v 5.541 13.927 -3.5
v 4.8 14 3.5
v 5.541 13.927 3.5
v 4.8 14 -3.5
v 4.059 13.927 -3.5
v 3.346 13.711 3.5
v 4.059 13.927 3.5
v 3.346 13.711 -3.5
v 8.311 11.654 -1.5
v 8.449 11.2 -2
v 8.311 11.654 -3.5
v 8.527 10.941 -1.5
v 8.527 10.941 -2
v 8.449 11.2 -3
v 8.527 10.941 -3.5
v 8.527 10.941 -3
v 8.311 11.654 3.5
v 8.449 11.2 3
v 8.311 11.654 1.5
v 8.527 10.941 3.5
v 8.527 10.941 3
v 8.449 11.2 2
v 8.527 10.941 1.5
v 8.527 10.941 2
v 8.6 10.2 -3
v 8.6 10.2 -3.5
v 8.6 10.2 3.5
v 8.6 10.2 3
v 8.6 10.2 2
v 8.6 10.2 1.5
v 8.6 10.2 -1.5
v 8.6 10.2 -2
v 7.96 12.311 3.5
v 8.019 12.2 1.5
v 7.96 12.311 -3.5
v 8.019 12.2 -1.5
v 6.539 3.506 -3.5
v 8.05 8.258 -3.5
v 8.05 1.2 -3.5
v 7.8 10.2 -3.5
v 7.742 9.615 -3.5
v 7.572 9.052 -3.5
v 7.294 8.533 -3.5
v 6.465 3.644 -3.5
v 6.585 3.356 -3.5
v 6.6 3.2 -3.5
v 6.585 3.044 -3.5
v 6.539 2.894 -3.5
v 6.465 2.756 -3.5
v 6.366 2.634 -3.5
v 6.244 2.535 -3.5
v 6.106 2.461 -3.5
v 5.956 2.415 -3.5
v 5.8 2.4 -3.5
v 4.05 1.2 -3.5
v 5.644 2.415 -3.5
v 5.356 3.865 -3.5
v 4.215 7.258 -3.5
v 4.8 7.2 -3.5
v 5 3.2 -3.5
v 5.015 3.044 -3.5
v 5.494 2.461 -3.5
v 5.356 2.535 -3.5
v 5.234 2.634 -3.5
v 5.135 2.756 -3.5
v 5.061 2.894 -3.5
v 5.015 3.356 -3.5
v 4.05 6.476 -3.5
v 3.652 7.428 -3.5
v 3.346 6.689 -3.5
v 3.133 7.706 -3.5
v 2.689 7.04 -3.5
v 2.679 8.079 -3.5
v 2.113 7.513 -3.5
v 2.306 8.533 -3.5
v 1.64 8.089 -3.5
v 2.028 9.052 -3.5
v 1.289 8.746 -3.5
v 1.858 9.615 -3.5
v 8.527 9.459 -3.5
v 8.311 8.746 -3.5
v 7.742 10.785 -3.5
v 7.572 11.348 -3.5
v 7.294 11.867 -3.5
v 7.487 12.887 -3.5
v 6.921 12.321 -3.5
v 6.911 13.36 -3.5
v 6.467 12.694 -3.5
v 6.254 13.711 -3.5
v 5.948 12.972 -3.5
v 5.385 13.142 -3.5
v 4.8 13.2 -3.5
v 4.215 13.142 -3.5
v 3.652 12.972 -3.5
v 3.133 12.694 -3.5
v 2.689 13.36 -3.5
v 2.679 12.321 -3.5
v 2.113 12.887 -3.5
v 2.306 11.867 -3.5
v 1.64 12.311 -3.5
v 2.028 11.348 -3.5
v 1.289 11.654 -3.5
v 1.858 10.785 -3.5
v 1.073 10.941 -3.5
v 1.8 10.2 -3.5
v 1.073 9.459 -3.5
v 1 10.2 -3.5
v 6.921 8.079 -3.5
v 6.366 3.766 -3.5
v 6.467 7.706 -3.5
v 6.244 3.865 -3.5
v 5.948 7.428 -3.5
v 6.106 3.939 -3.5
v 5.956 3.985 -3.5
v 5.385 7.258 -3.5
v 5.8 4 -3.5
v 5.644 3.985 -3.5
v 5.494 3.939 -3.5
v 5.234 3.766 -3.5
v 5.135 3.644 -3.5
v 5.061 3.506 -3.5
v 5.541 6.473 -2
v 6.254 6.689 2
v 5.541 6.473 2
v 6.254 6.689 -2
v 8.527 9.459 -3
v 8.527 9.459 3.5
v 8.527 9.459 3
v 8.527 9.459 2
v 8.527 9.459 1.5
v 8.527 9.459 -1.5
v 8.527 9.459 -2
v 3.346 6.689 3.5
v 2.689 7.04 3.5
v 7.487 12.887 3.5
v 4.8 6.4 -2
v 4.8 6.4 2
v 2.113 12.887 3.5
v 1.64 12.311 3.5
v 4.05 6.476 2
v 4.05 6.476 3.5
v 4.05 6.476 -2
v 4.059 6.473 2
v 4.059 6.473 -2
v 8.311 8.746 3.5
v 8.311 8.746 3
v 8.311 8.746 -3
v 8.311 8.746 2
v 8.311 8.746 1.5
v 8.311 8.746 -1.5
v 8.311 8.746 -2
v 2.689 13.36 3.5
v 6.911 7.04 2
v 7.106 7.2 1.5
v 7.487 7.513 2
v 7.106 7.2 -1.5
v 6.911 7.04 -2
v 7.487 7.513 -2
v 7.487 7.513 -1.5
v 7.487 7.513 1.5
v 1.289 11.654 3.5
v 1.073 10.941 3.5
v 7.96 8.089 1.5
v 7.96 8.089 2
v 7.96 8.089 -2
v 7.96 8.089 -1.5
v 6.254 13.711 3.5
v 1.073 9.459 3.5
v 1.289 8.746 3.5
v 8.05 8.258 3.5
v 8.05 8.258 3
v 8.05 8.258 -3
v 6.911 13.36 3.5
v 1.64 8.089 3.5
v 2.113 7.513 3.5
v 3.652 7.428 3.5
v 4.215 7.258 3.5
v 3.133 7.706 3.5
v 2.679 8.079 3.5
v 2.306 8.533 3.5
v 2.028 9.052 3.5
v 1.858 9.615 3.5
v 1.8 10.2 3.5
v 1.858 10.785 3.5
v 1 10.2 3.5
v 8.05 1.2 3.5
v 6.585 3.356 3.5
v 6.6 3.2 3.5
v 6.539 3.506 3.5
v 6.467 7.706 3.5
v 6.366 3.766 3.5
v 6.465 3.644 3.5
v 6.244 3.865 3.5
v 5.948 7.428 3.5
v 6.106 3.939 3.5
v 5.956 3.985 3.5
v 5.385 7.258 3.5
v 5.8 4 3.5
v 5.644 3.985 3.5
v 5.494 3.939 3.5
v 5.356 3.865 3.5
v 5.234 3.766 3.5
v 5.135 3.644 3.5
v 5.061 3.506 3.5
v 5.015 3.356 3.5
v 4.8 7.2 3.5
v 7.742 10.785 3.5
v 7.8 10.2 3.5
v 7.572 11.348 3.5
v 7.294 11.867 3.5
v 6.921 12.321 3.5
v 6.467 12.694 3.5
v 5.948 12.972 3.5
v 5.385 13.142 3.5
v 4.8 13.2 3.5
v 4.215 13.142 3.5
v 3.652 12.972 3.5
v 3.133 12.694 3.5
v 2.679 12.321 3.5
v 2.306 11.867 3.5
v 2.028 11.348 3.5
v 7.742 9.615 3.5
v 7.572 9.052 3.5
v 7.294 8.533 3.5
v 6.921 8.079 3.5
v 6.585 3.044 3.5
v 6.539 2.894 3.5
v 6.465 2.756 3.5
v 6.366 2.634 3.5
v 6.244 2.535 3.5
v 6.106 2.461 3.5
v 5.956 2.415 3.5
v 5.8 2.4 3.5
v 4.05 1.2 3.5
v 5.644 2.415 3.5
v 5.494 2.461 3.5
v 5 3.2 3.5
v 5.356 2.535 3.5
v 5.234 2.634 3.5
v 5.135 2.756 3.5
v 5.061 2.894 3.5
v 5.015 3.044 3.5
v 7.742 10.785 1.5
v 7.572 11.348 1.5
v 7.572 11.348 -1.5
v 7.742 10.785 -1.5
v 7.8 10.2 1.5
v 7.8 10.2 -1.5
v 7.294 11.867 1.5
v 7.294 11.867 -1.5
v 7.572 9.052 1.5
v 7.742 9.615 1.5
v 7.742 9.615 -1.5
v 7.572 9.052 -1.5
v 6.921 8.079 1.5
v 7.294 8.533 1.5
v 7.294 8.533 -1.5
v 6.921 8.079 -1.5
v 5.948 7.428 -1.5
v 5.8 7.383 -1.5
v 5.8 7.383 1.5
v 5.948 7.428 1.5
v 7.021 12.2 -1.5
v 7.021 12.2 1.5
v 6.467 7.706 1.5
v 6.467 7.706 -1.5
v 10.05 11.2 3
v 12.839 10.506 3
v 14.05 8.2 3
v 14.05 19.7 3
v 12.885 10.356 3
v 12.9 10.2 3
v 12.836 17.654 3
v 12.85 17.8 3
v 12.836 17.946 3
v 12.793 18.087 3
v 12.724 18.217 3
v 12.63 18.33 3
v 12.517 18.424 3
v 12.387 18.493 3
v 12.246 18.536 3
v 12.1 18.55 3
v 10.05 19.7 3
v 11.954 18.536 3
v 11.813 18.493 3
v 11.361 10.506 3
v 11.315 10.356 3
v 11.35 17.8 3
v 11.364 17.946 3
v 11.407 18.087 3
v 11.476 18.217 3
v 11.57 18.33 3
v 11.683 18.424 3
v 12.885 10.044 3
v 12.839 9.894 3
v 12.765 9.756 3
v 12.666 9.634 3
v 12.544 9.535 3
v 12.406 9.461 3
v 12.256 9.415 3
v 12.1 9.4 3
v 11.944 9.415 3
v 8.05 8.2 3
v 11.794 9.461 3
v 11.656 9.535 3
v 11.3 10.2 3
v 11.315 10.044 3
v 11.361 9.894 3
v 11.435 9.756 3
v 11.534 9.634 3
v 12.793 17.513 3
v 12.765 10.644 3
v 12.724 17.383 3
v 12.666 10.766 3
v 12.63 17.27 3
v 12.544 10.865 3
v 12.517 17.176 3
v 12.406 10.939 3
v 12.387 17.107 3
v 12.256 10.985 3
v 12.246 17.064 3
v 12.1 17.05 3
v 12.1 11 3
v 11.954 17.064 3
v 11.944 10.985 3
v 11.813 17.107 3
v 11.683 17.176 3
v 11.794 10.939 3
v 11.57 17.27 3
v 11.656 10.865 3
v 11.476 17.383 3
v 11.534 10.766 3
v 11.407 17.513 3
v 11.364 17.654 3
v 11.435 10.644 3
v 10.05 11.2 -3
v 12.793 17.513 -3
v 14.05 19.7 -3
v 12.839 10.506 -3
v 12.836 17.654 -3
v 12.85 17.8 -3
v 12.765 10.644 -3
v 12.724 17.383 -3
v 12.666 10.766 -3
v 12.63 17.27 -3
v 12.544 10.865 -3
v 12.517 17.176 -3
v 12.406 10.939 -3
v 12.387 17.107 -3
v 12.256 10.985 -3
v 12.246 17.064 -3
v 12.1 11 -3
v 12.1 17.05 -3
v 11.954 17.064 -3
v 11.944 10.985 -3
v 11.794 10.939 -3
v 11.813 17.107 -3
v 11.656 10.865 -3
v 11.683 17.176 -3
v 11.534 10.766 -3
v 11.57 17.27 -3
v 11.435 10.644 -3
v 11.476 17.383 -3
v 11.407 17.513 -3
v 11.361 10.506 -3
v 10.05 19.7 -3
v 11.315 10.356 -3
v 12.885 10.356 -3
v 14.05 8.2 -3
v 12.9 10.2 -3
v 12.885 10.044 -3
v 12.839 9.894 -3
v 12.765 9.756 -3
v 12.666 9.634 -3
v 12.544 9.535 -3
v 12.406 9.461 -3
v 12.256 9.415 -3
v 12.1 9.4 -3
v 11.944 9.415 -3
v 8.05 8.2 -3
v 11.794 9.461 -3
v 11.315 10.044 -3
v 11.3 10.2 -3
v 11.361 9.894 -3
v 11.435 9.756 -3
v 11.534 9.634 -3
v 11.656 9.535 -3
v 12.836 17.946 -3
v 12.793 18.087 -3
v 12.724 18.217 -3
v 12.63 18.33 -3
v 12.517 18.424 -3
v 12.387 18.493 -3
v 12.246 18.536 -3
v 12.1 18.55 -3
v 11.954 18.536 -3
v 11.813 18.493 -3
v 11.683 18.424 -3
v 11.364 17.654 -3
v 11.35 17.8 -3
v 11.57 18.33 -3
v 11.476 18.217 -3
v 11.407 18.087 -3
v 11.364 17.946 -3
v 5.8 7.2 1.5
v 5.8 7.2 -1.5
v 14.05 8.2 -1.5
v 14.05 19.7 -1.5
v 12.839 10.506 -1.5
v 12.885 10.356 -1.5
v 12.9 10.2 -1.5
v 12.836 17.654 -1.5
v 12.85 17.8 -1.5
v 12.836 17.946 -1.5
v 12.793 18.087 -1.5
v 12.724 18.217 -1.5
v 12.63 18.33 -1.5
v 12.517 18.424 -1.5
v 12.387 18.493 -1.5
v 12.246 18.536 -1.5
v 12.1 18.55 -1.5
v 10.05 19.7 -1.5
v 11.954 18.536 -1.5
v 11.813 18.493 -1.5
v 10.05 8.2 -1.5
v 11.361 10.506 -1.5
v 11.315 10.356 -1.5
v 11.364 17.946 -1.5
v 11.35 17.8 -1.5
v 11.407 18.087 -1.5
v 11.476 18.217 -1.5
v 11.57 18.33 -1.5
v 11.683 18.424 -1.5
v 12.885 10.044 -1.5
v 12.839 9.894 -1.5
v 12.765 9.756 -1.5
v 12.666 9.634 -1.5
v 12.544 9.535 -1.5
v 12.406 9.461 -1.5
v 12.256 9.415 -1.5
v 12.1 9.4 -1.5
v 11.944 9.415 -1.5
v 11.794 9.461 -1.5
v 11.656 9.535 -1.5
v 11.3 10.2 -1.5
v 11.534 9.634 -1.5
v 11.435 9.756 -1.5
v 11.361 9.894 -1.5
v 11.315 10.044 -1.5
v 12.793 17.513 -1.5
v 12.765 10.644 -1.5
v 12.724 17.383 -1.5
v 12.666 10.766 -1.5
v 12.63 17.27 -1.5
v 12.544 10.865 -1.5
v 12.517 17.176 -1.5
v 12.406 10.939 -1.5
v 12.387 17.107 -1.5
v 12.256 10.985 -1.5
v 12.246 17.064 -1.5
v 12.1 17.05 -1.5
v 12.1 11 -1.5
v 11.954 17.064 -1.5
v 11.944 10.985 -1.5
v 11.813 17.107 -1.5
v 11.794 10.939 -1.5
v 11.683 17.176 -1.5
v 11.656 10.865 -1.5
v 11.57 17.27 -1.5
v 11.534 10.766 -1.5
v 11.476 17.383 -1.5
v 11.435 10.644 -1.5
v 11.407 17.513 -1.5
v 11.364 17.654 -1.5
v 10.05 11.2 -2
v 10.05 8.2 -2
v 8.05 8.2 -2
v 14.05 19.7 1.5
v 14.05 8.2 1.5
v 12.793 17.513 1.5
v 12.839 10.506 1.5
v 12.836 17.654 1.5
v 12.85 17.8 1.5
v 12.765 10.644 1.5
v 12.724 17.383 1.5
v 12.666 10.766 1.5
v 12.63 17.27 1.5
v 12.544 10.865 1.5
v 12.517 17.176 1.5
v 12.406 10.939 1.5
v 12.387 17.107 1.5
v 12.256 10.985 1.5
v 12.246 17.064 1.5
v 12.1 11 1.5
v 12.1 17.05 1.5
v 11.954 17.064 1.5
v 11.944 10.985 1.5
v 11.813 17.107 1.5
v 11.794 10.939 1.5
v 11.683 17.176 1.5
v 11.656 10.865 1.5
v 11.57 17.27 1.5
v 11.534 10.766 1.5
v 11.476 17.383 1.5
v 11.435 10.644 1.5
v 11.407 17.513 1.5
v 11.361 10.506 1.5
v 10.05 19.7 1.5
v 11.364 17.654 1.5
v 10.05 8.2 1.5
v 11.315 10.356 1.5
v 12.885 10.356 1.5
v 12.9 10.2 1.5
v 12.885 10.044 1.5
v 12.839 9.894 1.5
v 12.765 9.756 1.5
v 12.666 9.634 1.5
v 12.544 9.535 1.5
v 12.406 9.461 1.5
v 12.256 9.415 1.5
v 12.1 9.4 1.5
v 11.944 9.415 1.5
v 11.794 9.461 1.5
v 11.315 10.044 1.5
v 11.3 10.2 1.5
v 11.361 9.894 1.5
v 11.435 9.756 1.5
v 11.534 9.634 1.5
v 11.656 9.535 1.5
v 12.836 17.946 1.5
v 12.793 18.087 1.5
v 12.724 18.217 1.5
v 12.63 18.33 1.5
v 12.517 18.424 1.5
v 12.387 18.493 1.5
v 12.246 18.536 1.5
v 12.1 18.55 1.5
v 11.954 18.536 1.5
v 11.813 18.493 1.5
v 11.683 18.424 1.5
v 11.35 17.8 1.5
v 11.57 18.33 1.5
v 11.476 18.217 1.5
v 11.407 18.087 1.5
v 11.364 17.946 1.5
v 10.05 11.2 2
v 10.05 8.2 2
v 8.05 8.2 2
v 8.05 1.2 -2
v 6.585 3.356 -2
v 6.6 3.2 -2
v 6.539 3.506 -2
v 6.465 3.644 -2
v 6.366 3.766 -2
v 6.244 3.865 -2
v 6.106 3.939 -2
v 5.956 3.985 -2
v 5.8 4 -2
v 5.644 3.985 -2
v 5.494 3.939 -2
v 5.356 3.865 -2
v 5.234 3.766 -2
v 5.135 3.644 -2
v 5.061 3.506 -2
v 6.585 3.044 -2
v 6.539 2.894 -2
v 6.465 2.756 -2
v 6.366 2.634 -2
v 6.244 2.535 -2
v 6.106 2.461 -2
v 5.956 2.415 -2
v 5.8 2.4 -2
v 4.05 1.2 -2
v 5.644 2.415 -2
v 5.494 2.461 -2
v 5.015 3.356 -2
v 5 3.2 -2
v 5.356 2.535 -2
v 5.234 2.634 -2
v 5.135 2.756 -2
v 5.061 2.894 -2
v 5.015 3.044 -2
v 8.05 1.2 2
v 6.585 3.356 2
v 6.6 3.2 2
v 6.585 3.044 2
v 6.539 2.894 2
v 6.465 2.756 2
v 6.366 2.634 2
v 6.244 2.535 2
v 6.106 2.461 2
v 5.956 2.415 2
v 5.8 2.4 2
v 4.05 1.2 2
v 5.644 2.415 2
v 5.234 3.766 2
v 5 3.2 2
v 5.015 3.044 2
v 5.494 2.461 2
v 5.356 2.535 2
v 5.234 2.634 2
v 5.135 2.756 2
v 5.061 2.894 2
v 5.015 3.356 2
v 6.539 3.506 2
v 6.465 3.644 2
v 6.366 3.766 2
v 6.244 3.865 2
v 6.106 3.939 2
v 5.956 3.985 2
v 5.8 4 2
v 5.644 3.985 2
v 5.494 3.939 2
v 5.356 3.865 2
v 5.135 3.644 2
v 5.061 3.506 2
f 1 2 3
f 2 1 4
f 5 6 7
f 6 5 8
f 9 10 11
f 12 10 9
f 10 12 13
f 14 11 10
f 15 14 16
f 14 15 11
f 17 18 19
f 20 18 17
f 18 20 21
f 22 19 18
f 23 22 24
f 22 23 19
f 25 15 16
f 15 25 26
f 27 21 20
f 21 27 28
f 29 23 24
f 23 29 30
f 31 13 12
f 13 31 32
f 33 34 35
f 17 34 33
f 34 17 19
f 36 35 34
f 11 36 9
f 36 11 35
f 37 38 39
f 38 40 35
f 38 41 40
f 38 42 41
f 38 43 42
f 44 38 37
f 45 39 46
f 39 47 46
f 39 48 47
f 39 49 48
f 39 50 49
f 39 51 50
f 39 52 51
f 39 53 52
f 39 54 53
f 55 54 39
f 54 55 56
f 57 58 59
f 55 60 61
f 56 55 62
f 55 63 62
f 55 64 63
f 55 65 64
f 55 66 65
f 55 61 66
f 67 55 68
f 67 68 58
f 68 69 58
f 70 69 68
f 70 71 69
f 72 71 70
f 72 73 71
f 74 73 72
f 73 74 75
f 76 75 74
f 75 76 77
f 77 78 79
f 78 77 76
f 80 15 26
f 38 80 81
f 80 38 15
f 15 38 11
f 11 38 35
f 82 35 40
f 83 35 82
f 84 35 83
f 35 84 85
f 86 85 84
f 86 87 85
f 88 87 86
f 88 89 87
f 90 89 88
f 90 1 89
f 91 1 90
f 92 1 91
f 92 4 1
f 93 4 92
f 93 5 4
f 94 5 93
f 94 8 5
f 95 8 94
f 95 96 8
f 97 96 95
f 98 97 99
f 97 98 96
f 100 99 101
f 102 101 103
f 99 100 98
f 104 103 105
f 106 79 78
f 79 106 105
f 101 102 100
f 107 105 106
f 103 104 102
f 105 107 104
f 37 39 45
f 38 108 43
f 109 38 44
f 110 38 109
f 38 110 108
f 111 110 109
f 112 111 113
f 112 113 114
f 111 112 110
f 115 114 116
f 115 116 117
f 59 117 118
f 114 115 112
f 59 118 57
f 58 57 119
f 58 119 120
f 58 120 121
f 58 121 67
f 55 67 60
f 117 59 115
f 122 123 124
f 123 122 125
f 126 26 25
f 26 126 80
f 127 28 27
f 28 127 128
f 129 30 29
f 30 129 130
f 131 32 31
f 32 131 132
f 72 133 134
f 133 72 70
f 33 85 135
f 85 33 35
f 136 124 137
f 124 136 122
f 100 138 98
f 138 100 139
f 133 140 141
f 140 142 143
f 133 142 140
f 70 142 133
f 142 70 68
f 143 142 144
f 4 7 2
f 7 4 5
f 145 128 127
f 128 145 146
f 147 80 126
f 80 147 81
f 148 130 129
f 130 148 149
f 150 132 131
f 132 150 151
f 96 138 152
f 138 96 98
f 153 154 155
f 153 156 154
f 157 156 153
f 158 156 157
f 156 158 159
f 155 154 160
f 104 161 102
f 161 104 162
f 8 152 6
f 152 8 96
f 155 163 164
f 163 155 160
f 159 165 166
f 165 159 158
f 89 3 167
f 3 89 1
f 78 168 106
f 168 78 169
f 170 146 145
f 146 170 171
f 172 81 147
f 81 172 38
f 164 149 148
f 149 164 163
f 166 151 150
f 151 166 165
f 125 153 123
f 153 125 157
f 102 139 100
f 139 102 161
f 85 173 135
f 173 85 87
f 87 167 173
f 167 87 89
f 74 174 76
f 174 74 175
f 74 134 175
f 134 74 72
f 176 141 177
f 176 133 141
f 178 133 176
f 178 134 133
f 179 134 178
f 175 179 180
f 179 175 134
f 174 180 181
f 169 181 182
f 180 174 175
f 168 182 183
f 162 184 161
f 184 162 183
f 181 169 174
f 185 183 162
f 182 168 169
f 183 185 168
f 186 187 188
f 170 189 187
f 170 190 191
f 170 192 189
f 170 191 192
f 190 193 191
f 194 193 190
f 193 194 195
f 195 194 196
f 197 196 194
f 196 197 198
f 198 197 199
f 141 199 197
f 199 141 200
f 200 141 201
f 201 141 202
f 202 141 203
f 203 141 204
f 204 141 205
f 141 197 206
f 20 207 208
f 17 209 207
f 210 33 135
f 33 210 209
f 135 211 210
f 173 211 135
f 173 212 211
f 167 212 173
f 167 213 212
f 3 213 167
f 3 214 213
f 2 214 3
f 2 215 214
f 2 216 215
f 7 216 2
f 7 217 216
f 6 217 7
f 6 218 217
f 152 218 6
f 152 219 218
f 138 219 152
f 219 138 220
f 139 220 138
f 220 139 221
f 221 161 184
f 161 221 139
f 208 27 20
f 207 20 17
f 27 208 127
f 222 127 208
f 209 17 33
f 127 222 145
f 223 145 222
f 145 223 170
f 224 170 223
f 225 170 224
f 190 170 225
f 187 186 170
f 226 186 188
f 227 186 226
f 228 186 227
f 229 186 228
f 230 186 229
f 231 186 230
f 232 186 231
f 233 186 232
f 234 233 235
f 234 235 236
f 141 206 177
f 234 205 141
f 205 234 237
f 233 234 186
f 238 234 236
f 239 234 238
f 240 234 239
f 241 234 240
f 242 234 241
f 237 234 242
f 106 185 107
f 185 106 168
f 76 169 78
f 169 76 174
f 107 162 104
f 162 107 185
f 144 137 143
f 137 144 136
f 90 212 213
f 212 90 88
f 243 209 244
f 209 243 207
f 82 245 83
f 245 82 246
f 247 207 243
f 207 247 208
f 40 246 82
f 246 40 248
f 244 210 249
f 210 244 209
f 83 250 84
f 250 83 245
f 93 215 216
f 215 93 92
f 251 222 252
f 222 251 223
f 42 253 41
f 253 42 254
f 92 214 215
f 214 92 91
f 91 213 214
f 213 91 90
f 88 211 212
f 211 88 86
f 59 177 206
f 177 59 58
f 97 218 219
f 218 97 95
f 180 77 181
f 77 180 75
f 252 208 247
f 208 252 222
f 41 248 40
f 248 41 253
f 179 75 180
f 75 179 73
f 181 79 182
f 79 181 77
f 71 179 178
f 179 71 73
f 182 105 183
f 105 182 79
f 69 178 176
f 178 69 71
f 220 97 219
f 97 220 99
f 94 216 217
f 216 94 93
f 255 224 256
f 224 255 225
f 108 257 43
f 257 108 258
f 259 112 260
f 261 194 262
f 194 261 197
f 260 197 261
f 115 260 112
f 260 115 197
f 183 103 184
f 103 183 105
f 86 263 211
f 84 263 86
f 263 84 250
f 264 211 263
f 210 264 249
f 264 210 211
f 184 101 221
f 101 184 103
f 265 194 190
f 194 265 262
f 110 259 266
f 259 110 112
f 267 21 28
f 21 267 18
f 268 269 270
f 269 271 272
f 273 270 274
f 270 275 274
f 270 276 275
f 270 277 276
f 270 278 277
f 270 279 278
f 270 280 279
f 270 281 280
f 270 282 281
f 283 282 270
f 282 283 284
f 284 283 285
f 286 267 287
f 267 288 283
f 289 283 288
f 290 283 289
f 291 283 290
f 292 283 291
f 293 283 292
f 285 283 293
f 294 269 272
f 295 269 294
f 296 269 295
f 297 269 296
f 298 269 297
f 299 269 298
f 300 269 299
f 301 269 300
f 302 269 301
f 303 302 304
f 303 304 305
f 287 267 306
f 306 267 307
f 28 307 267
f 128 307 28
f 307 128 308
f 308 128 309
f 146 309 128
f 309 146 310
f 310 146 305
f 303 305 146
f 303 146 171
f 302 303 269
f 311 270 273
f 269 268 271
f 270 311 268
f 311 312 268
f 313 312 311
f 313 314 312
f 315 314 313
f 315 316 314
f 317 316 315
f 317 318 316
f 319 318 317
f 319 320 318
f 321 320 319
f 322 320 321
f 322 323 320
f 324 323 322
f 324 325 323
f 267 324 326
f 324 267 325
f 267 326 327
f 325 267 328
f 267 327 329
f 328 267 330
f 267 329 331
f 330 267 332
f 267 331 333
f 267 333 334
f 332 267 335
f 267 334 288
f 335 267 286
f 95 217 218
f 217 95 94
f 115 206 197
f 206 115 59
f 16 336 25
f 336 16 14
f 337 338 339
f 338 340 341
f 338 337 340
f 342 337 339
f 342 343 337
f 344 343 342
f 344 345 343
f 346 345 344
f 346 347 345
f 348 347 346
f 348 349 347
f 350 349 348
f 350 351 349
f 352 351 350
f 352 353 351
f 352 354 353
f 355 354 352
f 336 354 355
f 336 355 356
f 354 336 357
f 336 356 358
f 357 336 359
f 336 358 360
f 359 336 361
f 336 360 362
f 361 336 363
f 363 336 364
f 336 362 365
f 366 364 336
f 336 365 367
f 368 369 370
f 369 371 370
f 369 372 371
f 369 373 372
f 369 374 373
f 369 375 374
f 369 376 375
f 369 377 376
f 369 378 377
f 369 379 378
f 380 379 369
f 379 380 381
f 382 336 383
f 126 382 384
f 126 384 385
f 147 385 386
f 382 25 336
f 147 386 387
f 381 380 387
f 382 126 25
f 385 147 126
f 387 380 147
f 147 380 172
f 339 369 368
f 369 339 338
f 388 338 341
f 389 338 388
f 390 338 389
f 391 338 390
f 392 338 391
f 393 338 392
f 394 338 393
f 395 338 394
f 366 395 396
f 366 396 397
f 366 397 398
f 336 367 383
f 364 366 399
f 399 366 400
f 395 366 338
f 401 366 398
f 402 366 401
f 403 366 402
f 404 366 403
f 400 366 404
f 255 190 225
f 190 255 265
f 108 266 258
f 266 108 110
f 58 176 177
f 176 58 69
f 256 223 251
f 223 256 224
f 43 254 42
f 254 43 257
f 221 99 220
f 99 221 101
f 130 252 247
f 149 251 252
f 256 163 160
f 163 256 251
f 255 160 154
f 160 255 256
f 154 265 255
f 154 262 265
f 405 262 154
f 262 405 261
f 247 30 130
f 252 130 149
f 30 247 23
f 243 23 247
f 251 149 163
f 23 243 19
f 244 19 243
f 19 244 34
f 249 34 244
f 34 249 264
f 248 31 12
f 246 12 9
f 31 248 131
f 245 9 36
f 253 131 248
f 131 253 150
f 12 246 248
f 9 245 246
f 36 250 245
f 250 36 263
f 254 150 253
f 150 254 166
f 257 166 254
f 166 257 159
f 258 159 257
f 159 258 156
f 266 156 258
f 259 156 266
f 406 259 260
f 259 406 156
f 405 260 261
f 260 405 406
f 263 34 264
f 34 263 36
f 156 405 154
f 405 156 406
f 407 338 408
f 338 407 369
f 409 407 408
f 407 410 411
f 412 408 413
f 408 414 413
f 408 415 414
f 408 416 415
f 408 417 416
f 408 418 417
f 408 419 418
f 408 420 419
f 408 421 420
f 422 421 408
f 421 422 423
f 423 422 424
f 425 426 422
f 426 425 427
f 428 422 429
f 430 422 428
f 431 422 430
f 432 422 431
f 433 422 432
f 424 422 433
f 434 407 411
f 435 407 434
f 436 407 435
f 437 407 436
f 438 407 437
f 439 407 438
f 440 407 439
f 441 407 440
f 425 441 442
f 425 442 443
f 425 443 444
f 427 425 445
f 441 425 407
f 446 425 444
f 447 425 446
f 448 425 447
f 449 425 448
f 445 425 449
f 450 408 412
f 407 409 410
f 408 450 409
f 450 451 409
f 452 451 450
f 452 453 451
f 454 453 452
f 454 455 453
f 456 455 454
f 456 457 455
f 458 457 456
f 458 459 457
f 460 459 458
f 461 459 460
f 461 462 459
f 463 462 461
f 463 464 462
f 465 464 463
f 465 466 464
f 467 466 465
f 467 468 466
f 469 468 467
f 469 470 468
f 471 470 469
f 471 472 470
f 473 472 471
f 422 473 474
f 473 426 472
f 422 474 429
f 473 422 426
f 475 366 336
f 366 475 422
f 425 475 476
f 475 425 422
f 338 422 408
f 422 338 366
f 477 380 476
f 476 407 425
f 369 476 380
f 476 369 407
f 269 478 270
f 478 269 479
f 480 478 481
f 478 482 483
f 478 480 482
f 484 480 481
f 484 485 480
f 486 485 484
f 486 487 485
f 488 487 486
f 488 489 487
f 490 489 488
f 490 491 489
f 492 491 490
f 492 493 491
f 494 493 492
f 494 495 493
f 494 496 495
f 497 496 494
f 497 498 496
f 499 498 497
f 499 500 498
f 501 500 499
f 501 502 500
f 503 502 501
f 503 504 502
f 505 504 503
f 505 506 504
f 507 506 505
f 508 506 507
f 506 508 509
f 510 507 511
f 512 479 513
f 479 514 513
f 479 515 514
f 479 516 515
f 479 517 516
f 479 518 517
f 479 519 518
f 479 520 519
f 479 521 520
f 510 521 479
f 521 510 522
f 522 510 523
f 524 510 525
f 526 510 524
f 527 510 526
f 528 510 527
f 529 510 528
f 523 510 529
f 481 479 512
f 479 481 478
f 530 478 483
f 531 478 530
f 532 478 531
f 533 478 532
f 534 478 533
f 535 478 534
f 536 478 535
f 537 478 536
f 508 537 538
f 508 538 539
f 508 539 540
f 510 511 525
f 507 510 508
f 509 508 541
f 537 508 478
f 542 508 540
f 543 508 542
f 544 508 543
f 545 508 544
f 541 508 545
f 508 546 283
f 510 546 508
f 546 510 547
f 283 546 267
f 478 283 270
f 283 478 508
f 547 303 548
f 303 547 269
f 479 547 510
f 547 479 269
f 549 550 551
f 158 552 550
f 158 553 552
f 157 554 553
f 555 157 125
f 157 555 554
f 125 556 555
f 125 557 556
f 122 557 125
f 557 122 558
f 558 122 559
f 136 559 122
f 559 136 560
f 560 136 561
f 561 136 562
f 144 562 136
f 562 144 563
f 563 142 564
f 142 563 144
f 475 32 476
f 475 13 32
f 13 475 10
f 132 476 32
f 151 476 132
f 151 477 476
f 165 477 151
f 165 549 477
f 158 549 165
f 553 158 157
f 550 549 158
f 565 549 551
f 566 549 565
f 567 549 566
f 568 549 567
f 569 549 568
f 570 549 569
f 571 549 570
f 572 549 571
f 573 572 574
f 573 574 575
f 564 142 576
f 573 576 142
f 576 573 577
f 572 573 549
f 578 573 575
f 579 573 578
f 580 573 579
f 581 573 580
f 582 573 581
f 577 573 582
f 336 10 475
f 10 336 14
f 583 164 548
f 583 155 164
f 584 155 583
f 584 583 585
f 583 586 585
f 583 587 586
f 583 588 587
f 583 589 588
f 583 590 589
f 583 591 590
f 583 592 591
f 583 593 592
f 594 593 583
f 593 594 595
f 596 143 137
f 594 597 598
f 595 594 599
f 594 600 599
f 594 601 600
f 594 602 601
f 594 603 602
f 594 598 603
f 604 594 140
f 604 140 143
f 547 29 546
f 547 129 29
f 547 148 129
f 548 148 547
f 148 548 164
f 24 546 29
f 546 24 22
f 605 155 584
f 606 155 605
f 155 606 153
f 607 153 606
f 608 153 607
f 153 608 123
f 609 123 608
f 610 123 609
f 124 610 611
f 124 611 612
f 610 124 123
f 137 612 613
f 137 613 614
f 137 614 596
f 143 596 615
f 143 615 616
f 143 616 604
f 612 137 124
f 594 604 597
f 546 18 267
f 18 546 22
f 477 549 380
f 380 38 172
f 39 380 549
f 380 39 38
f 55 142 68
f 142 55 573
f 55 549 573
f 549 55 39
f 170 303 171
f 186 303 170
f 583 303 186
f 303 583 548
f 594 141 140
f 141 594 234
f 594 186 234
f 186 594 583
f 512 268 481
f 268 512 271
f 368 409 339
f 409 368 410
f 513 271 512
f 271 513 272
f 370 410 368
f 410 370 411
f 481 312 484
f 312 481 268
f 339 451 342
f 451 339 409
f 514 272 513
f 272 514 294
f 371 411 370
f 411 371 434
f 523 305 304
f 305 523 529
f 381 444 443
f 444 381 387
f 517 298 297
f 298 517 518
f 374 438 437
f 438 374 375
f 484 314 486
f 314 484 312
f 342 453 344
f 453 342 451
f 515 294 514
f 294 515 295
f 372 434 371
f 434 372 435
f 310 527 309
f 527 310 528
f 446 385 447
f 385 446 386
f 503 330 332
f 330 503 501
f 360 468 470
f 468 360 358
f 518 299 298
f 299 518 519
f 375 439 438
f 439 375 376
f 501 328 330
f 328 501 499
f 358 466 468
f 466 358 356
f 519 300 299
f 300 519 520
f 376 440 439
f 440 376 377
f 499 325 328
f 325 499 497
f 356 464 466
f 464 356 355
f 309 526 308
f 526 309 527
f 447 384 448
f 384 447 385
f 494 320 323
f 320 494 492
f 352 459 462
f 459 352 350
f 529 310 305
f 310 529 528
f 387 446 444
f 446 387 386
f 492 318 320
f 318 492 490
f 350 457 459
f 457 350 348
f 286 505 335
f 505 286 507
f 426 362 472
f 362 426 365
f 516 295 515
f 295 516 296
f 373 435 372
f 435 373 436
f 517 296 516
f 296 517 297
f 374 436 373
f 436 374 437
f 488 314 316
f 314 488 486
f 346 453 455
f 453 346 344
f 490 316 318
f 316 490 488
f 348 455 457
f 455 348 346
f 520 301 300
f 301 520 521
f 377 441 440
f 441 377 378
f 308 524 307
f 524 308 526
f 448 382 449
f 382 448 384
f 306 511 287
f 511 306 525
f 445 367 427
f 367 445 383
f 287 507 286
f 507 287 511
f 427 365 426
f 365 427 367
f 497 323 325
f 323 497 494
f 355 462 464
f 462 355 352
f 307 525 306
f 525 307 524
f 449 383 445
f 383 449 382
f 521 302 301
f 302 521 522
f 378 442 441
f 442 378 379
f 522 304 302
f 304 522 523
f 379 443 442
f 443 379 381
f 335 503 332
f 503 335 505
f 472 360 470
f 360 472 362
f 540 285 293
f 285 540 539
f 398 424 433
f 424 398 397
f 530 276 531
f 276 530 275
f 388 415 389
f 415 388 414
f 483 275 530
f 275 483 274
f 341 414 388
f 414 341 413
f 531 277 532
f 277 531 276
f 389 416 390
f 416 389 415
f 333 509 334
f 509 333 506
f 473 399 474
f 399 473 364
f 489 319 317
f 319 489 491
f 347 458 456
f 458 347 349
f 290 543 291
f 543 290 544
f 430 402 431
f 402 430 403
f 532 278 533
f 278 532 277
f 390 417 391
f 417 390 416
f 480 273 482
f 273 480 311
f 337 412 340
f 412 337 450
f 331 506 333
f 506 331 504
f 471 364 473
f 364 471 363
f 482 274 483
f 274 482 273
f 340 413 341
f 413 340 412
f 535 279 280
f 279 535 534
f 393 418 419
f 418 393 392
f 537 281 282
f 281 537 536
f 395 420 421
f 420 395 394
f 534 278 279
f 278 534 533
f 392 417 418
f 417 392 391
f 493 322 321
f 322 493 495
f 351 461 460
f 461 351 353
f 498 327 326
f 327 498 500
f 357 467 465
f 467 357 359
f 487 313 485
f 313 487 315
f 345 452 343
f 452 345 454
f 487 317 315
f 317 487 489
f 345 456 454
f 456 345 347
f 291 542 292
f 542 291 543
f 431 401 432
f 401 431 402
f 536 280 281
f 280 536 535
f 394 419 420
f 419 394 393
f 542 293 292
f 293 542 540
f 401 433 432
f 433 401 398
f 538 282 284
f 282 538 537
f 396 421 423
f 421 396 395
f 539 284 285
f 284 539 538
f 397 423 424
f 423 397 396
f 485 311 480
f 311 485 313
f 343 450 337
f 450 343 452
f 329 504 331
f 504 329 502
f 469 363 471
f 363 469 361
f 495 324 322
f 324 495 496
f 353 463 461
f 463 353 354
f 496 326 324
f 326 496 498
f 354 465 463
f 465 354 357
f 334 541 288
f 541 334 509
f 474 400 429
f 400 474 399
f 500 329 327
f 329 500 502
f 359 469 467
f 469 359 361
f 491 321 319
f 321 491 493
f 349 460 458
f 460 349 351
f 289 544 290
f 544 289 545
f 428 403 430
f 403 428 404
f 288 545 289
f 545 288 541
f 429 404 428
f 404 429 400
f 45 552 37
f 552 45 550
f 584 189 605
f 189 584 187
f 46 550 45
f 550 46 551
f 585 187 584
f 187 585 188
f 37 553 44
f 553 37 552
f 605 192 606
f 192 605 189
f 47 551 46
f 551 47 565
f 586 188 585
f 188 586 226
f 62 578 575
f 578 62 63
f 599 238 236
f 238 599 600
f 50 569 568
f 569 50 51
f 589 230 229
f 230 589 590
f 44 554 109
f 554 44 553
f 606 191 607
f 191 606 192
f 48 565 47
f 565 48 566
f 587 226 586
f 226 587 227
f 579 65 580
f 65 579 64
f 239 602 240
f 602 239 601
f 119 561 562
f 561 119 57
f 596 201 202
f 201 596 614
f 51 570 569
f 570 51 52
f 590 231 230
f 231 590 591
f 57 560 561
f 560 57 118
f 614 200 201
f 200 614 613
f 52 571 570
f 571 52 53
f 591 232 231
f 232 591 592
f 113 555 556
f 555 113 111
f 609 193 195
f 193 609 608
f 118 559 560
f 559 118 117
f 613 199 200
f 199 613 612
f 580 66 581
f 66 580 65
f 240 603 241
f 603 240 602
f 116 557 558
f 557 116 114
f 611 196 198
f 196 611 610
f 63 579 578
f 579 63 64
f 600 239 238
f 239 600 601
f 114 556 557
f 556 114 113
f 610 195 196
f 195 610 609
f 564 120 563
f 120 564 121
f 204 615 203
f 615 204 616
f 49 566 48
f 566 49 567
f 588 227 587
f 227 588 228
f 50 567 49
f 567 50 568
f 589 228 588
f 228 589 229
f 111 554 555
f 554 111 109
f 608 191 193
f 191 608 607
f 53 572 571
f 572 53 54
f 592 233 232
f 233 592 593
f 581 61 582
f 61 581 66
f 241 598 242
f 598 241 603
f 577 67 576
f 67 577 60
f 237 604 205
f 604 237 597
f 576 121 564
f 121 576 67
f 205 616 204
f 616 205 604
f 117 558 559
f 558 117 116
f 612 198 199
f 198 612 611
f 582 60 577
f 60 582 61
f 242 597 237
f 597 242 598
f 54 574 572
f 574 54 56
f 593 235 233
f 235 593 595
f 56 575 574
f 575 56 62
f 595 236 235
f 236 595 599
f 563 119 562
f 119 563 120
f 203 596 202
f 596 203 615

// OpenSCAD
use <Railcar2.scad>;

module Pulley(r) {
	translate([0,0,-1.75/2]) {
		cylinder(r=r,h=1.75, $fn=32);
		cylinder(r1=r+0.5,r2=r, h=1.75/2, $fn=32);
		translate([0,0,1.75/2])
			cylinder(r1=r, r2=r+0.5, h=1.75/2, $fn=32);
	}
}

module NigelLawtonMotor() {
	translate([0,0,-6]) {
		cylinder(r=3, h=10, $fn=32);
		cylinder(r=0.4, h=12, $fn=32);
		translate([0,0,11])
			Pulley(1.1/2);
	}
}

// Really 0.75 but cut to 0.8 to run smoothly
// when subtracted
module LayShaft() {
	cylinder(r=0.8, h=14, $fn=32, center=true);
}

module Wheel() {
	cylinder(r=3.1, h=2, $fn=32);
	cylinder(r=3.4, h=0.2, $fn=32);
}

module Axle() {
	cylinder(r=0.75, h=15.7, $fn=32, center=true);
	translate([0,0,3.8])
		Wheel();
	translate([0,0,-3.8])
		mirror([0,0,1])
			Wheel();
}


module MotorCarrier() {
	difference() {
		cylinder(r=3.8, h=7, $fn=32, center=true);
		cylinder(r=3, h=6, $fn=32, center=true);
	}
}


//MotorCarrier();


module Mechanism() {
	translate([-1,0,0])
	NigelLawtonMotor();
	translate([6.3,0,0]) {
		LayShaft();
		// Can fit a 3.5 if this is on the +ve side
		// for two stages
		translate([0,0,-5])
			Pulley(2.5);
		Pulley(1.7/2);
	}
	translate([6.3,7.6,0]) {
			Axle();
			Pulley(2.5);
	}
	// Try extra stage
	translate([0,-7,0]) {
		LayShaft();
		translate([0,0,-5])
			Pulley(1.7/2);
		translate([0,0,5])
			Pulley(2.5);
	}
}

module DriveMountingMain() {
	difference() {
		translate([-1,0,0])
			MotorCarrier();
		translate([0,-3,-1.5])
			cube([7,5,3]);
	}
	translate([4.25,-2,-3])
		cube([4,11.5,1.5]);
	translate([4.25,-2,1.5])
		cube([4,11.5,1.5]);
	translate([0,-2,-3])
		cube([8,3,1]);
	translate([0,-2,2])
		cube([8,3,1]);
	// and extra stage
	translate([-1.75,-9,-3.5])
		cube([4,7.5,1.5]);
	translate([-1.75,-9,2])
		cube([4,7.5,1.5]);
}

module DriveMounting() {
	difference() {
		DriveMountingMain();
		Mechanism();
	}
}

//rotate([0,90,0])
//	KESRRailcar();

translate([5.8,13-2.8,0]) {
	DriveMounting();
%	Mechanism();
}



//% translate([-4,-3,-7])
//	cube([10.5,7.5,14]);
